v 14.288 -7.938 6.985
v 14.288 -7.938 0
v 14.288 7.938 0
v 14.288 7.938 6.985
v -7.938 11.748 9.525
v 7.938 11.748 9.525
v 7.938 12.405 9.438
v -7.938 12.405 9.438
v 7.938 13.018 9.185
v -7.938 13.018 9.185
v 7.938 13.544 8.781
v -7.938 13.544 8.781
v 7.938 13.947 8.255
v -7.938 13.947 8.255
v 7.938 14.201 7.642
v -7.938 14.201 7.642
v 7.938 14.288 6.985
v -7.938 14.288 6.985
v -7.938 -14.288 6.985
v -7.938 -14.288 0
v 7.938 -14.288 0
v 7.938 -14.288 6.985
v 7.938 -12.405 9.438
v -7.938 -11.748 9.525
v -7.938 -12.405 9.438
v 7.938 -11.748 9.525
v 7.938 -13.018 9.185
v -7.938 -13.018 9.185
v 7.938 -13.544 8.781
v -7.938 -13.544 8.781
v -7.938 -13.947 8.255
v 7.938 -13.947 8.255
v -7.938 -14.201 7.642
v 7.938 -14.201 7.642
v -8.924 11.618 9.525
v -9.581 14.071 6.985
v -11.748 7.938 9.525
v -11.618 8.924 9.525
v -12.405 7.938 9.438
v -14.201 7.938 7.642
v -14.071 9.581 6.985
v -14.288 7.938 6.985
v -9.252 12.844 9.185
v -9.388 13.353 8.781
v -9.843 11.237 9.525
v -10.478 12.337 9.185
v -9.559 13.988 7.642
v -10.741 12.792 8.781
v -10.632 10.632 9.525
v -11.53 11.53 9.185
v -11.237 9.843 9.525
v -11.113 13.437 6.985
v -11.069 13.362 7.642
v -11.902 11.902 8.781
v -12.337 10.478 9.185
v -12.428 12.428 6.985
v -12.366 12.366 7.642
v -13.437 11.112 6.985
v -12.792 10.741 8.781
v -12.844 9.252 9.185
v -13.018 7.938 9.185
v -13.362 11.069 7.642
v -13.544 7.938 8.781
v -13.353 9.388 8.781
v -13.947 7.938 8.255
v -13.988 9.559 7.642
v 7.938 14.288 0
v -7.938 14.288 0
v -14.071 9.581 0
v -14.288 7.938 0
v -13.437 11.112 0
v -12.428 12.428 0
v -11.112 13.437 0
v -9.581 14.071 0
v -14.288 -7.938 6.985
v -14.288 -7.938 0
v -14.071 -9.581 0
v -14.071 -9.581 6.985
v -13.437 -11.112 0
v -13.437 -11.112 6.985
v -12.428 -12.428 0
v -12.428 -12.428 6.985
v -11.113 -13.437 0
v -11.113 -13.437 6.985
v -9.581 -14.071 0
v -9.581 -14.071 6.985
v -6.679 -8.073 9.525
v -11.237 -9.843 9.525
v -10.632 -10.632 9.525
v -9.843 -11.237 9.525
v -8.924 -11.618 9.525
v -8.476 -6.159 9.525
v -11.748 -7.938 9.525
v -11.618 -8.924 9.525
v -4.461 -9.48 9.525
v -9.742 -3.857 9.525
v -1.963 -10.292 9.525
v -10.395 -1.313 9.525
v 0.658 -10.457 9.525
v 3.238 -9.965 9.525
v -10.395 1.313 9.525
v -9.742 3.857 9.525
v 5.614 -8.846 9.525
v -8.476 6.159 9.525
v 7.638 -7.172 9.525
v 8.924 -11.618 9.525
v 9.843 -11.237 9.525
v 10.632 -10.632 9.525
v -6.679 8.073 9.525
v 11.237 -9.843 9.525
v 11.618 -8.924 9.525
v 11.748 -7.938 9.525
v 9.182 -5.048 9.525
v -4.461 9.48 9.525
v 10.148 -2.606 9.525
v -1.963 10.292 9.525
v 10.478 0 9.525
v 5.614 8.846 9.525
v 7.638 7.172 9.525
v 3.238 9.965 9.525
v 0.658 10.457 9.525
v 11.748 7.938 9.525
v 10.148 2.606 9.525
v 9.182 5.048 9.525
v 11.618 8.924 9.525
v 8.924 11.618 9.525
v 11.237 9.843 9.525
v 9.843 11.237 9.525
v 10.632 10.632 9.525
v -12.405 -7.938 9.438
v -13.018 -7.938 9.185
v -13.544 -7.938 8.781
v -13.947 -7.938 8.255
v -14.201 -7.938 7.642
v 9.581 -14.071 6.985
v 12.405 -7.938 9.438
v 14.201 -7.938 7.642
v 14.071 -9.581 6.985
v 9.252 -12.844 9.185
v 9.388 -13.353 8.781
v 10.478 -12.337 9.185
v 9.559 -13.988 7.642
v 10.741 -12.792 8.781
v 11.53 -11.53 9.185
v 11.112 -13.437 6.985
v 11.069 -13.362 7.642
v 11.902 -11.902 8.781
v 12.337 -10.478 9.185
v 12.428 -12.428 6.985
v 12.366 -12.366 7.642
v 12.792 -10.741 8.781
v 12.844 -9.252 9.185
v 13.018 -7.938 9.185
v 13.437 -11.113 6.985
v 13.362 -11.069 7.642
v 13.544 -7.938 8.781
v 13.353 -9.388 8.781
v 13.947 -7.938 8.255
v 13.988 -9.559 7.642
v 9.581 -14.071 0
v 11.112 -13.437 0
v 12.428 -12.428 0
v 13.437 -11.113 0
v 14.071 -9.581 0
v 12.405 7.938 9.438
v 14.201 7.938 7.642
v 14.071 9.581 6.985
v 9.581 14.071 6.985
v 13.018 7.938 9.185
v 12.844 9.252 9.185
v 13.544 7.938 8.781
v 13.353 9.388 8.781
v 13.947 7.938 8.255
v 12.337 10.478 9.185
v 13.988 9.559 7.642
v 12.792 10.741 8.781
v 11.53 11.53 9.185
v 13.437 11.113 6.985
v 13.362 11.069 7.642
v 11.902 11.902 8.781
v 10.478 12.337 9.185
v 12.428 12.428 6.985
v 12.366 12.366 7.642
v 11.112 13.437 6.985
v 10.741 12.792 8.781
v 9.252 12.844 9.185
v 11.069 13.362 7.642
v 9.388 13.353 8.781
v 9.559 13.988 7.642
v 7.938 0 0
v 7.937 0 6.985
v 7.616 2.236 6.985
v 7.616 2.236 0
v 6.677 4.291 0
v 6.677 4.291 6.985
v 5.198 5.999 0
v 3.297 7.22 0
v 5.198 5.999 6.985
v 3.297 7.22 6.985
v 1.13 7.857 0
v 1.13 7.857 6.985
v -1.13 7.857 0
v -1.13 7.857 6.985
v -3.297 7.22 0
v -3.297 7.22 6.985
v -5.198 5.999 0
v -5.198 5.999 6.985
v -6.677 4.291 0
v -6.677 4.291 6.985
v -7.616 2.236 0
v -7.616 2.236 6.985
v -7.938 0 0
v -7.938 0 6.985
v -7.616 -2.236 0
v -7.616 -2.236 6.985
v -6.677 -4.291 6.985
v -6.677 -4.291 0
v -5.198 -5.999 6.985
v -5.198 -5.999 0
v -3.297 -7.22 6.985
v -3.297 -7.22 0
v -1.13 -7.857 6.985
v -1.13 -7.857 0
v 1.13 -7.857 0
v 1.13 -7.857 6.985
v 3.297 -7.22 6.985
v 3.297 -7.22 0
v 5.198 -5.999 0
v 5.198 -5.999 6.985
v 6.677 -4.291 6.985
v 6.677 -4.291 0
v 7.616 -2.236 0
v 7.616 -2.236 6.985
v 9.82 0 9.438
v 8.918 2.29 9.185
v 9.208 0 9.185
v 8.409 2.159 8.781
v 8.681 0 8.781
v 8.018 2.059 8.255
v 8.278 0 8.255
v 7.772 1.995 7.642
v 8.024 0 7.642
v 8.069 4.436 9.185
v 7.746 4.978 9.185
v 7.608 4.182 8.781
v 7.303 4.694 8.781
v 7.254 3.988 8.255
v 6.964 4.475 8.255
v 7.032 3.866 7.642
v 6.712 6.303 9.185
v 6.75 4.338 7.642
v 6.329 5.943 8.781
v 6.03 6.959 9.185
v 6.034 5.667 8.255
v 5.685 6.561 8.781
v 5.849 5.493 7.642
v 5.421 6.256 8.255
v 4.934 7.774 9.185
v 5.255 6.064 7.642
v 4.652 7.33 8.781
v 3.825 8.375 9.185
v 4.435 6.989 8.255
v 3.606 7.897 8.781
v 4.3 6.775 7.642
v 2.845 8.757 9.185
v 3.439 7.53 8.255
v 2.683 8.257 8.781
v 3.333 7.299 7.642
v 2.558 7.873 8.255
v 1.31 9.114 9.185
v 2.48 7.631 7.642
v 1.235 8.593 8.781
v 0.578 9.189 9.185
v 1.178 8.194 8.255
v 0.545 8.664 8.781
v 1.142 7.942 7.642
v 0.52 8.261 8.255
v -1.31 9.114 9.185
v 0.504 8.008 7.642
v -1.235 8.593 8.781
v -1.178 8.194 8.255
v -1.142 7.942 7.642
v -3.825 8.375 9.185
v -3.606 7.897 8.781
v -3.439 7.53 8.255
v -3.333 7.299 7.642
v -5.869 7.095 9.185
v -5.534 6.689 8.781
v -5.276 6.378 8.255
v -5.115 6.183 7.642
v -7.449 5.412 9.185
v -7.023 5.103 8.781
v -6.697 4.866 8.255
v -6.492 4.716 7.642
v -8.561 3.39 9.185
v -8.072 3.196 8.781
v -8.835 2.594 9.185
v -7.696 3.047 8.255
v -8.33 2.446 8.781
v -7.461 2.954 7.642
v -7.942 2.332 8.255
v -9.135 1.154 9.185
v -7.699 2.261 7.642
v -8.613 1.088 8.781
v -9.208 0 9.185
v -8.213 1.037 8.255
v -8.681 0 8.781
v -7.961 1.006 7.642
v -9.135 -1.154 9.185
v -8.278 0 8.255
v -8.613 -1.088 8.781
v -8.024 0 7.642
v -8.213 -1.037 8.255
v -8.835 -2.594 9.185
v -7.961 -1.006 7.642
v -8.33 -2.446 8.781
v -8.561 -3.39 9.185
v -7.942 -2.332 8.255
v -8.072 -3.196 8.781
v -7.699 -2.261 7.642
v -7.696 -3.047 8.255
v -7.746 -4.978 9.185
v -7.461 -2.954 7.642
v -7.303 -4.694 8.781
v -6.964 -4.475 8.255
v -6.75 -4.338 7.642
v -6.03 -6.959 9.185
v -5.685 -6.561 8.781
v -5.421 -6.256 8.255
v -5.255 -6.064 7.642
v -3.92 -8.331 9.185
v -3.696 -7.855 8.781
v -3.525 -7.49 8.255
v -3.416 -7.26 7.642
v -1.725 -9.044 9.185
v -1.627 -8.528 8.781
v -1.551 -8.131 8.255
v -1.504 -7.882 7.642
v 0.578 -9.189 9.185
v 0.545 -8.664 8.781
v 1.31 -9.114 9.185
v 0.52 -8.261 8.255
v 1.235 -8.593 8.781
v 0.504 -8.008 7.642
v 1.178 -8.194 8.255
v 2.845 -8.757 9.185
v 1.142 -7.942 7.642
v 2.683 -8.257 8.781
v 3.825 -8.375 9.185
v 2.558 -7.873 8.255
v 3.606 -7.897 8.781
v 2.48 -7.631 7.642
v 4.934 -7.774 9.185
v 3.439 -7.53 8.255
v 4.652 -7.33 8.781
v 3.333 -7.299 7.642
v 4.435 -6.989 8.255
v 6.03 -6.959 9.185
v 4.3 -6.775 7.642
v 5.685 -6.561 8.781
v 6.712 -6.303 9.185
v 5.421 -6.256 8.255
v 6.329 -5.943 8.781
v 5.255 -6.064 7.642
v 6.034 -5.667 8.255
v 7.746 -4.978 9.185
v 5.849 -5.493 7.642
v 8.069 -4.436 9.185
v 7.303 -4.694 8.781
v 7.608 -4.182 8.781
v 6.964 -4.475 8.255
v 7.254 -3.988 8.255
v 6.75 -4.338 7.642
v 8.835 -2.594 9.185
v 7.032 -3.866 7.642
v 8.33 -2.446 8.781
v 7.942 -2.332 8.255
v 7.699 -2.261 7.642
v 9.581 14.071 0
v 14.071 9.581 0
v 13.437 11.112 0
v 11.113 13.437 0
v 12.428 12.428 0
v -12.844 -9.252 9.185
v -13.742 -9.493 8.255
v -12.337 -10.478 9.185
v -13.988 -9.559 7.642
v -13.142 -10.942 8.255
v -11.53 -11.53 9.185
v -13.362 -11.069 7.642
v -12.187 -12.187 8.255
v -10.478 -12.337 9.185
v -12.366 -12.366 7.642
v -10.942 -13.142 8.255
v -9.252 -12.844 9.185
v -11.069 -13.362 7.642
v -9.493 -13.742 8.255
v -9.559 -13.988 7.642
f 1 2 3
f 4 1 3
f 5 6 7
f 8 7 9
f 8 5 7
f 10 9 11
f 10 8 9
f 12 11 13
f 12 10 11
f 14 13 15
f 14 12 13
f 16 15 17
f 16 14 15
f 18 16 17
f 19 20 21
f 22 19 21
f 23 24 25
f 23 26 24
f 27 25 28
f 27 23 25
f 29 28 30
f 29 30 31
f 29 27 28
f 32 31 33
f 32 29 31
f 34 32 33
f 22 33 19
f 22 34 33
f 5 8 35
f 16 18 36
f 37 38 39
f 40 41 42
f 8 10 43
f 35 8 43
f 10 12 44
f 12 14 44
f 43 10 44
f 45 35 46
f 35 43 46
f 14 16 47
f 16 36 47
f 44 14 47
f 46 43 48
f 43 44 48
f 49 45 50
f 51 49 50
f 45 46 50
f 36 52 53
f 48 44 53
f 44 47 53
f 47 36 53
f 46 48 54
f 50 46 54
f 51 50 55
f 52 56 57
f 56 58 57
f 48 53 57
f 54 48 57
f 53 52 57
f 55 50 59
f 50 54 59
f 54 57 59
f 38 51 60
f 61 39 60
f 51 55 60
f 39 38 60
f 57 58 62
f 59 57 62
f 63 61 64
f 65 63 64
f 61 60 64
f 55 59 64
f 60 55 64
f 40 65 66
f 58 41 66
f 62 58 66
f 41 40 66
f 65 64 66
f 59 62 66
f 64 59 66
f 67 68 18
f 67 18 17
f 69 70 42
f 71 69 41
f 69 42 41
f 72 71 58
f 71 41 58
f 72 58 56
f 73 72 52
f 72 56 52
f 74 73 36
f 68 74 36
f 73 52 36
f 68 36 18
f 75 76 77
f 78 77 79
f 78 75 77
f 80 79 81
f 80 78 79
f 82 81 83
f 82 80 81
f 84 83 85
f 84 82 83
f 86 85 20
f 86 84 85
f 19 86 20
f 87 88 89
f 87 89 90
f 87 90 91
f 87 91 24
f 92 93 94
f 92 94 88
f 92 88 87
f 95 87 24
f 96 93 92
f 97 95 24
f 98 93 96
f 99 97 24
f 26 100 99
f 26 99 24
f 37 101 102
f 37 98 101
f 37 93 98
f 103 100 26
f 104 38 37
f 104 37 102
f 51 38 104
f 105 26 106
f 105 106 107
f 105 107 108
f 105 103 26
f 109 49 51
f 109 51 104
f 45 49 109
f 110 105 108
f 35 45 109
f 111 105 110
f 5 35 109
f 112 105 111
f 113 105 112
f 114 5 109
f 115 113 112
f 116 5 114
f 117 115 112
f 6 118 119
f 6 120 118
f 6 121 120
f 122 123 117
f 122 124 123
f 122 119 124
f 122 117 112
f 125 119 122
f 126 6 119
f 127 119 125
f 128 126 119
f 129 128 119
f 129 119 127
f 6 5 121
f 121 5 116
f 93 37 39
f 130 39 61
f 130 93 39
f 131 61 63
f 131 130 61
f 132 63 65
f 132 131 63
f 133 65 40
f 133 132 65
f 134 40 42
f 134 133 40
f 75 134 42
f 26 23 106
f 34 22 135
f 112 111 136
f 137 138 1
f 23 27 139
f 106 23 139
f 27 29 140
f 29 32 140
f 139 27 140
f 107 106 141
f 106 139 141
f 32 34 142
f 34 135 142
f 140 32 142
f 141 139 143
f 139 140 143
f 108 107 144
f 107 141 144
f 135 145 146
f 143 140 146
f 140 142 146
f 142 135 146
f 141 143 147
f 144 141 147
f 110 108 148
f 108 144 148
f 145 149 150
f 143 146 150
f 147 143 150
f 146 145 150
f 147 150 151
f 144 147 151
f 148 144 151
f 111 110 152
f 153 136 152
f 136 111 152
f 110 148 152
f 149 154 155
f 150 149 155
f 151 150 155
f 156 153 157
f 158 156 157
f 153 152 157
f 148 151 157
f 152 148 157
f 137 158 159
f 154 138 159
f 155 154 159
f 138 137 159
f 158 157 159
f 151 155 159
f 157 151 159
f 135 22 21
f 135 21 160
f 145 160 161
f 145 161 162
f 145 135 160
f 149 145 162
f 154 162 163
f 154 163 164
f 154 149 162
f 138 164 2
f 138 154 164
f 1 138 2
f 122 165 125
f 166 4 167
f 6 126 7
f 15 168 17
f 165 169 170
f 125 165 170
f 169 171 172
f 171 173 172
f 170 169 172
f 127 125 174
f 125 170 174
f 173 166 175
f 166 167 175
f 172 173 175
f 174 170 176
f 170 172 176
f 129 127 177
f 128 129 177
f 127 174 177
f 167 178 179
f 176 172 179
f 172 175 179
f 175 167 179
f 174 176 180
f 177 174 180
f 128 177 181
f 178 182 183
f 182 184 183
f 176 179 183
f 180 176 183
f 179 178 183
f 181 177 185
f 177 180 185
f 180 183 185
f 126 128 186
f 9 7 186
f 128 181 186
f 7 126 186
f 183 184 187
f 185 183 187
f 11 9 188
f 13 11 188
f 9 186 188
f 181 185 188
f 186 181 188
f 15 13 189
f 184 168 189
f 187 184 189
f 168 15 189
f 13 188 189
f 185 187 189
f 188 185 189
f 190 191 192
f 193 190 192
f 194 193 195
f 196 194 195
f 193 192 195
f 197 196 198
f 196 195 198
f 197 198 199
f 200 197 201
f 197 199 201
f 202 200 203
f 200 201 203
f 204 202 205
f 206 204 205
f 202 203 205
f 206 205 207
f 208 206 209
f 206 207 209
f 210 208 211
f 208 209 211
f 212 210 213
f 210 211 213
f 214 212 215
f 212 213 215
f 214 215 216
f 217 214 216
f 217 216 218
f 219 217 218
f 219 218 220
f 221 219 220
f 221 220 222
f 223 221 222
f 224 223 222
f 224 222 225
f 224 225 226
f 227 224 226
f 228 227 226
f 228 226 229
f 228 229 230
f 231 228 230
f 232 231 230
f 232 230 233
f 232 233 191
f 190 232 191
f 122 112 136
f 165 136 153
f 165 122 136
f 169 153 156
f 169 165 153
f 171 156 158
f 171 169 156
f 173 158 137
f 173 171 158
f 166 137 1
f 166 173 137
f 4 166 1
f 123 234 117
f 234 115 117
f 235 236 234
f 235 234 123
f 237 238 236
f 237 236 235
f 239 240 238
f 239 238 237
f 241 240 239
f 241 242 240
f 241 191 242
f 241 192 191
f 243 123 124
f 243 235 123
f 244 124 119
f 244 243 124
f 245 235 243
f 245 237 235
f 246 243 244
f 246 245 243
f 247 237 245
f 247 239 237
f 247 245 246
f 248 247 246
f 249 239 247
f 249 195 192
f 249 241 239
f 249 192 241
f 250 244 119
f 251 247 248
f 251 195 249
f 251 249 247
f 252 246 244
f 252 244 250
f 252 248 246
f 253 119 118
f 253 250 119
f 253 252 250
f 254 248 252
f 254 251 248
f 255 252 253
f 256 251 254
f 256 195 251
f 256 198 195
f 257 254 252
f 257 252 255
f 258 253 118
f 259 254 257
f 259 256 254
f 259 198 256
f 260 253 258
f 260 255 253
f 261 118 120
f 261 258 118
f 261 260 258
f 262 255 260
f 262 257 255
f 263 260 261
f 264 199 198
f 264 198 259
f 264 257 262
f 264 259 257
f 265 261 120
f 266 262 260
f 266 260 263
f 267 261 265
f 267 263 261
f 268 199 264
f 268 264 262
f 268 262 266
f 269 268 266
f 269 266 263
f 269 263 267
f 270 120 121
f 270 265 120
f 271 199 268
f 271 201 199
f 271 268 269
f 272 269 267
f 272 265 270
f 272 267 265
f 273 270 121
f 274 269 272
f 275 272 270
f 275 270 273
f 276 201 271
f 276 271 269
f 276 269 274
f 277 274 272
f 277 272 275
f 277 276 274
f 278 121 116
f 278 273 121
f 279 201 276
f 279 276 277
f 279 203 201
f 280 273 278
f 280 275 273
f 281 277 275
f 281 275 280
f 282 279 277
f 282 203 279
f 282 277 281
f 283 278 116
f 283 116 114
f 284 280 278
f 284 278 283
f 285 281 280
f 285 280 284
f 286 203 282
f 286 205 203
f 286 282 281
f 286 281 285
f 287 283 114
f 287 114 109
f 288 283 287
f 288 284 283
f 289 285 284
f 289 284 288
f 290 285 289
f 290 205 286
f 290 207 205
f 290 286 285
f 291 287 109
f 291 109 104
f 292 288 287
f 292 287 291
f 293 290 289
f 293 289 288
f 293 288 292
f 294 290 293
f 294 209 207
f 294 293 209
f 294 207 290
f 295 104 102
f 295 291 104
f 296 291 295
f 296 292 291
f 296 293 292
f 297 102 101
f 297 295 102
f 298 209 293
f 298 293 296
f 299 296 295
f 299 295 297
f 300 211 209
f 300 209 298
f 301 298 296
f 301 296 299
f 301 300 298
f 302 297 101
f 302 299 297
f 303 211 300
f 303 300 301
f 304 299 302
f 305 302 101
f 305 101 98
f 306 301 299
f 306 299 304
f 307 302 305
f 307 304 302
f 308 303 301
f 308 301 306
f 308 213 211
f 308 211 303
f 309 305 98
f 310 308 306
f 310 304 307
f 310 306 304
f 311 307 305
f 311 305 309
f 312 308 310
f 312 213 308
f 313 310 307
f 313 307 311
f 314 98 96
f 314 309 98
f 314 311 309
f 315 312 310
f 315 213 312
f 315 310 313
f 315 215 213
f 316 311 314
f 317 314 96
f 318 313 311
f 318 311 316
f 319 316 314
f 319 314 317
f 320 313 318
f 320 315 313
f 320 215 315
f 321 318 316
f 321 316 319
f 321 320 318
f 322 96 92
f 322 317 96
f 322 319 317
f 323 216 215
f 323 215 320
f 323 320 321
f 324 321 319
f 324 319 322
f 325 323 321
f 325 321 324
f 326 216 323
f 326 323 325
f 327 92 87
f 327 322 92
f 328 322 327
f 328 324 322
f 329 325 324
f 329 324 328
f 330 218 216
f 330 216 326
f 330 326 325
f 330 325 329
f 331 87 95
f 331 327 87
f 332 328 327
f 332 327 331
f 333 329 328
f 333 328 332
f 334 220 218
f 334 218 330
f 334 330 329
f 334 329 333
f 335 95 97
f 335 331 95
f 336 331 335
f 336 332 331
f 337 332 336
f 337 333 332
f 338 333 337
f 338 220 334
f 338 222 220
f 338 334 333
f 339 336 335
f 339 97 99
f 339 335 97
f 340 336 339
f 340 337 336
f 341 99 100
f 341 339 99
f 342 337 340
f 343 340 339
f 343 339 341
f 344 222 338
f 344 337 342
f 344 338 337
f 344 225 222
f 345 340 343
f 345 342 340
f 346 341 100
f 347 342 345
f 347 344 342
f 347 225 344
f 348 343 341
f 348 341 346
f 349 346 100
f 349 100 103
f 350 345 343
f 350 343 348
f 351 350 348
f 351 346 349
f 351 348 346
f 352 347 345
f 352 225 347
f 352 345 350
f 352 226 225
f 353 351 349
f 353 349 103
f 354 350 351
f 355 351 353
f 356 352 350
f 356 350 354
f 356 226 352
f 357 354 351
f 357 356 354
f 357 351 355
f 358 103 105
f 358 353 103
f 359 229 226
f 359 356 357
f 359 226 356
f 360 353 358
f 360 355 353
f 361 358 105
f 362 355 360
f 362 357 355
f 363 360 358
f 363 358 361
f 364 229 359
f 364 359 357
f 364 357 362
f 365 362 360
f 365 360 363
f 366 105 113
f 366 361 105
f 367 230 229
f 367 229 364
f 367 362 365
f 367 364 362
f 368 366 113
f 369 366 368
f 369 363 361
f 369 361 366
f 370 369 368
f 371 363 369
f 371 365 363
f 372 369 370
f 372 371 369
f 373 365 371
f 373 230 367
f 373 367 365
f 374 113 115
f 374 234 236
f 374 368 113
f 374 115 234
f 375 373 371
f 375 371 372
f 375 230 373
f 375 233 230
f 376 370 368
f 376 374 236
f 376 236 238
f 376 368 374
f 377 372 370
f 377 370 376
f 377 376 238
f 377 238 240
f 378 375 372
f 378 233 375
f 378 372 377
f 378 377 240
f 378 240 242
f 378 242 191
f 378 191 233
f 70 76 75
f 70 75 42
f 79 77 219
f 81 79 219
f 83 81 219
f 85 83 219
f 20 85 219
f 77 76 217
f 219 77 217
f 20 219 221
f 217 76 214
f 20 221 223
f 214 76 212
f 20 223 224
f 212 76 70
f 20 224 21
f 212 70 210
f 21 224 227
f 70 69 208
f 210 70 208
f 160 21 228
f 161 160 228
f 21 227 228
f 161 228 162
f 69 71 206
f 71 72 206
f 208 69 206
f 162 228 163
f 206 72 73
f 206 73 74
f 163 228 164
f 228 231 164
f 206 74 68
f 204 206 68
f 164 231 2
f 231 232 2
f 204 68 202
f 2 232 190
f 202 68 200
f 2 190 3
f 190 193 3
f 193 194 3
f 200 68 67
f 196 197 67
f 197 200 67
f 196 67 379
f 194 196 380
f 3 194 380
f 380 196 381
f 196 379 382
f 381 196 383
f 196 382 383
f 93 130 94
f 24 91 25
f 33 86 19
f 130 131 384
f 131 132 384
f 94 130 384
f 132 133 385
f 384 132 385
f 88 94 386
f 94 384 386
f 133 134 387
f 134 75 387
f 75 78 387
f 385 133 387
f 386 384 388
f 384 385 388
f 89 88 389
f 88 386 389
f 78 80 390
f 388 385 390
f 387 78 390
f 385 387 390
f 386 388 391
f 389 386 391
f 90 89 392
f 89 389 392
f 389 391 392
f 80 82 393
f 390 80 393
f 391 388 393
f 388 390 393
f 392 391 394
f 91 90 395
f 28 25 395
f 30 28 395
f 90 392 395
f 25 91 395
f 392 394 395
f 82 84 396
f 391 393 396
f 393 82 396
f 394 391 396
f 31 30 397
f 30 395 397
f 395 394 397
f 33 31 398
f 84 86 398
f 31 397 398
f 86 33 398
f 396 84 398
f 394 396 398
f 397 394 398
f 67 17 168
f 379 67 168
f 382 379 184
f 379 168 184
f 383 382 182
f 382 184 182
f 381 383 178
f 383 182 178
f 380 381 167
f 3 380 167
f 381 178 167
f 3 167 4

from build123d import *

# Parameters (mm, degrees)
F0_W     = 28.575
F0_H     = 28.575
F1_DEPTH = 9.525
F2_R     = 7.9375
F3_DEPTH = 9.526
F4_R     = 6.35
F5_R     = 2.54


with BuildPart() as f1:
    # F0 (on Top) → F1 (new body)
    with BuildSketch(Plane.XY):
        Rectangle(F0_W, F0_H)
    extrude(amount=F1_DEPTH)

    # F2 (on face) → F3 (cut, through all)
    with BuildSketch(Plane.XY.offset(9.525)):
        Circle(F2_R)
    extrude(amount=-F3_DEPTH, mode=Mode.SUBTRACT)

    # F4
    f4_edges = [f1.edges().sort_by_distance(p)[0] for p in [
        (-14.2875, -14.2875, 4.7625),
        (-14.2875, 14.2875, 4.7625),
        (14.2875, -14.2875, 4.7625),
        (14.2875, 14.2875, 4.7625),
    ]]
    fillet(f4_edges, radius=F4_R)

    # F5
    f5_edges = [f1.edges().sort_by_distance(p)[0] for p in [
        (-7.9375, 0, 9.525),
        (0, -14.2875, 9.525),
    ]]
    fillet(f5_edges, radius=F5_R)


solid = f1.part
